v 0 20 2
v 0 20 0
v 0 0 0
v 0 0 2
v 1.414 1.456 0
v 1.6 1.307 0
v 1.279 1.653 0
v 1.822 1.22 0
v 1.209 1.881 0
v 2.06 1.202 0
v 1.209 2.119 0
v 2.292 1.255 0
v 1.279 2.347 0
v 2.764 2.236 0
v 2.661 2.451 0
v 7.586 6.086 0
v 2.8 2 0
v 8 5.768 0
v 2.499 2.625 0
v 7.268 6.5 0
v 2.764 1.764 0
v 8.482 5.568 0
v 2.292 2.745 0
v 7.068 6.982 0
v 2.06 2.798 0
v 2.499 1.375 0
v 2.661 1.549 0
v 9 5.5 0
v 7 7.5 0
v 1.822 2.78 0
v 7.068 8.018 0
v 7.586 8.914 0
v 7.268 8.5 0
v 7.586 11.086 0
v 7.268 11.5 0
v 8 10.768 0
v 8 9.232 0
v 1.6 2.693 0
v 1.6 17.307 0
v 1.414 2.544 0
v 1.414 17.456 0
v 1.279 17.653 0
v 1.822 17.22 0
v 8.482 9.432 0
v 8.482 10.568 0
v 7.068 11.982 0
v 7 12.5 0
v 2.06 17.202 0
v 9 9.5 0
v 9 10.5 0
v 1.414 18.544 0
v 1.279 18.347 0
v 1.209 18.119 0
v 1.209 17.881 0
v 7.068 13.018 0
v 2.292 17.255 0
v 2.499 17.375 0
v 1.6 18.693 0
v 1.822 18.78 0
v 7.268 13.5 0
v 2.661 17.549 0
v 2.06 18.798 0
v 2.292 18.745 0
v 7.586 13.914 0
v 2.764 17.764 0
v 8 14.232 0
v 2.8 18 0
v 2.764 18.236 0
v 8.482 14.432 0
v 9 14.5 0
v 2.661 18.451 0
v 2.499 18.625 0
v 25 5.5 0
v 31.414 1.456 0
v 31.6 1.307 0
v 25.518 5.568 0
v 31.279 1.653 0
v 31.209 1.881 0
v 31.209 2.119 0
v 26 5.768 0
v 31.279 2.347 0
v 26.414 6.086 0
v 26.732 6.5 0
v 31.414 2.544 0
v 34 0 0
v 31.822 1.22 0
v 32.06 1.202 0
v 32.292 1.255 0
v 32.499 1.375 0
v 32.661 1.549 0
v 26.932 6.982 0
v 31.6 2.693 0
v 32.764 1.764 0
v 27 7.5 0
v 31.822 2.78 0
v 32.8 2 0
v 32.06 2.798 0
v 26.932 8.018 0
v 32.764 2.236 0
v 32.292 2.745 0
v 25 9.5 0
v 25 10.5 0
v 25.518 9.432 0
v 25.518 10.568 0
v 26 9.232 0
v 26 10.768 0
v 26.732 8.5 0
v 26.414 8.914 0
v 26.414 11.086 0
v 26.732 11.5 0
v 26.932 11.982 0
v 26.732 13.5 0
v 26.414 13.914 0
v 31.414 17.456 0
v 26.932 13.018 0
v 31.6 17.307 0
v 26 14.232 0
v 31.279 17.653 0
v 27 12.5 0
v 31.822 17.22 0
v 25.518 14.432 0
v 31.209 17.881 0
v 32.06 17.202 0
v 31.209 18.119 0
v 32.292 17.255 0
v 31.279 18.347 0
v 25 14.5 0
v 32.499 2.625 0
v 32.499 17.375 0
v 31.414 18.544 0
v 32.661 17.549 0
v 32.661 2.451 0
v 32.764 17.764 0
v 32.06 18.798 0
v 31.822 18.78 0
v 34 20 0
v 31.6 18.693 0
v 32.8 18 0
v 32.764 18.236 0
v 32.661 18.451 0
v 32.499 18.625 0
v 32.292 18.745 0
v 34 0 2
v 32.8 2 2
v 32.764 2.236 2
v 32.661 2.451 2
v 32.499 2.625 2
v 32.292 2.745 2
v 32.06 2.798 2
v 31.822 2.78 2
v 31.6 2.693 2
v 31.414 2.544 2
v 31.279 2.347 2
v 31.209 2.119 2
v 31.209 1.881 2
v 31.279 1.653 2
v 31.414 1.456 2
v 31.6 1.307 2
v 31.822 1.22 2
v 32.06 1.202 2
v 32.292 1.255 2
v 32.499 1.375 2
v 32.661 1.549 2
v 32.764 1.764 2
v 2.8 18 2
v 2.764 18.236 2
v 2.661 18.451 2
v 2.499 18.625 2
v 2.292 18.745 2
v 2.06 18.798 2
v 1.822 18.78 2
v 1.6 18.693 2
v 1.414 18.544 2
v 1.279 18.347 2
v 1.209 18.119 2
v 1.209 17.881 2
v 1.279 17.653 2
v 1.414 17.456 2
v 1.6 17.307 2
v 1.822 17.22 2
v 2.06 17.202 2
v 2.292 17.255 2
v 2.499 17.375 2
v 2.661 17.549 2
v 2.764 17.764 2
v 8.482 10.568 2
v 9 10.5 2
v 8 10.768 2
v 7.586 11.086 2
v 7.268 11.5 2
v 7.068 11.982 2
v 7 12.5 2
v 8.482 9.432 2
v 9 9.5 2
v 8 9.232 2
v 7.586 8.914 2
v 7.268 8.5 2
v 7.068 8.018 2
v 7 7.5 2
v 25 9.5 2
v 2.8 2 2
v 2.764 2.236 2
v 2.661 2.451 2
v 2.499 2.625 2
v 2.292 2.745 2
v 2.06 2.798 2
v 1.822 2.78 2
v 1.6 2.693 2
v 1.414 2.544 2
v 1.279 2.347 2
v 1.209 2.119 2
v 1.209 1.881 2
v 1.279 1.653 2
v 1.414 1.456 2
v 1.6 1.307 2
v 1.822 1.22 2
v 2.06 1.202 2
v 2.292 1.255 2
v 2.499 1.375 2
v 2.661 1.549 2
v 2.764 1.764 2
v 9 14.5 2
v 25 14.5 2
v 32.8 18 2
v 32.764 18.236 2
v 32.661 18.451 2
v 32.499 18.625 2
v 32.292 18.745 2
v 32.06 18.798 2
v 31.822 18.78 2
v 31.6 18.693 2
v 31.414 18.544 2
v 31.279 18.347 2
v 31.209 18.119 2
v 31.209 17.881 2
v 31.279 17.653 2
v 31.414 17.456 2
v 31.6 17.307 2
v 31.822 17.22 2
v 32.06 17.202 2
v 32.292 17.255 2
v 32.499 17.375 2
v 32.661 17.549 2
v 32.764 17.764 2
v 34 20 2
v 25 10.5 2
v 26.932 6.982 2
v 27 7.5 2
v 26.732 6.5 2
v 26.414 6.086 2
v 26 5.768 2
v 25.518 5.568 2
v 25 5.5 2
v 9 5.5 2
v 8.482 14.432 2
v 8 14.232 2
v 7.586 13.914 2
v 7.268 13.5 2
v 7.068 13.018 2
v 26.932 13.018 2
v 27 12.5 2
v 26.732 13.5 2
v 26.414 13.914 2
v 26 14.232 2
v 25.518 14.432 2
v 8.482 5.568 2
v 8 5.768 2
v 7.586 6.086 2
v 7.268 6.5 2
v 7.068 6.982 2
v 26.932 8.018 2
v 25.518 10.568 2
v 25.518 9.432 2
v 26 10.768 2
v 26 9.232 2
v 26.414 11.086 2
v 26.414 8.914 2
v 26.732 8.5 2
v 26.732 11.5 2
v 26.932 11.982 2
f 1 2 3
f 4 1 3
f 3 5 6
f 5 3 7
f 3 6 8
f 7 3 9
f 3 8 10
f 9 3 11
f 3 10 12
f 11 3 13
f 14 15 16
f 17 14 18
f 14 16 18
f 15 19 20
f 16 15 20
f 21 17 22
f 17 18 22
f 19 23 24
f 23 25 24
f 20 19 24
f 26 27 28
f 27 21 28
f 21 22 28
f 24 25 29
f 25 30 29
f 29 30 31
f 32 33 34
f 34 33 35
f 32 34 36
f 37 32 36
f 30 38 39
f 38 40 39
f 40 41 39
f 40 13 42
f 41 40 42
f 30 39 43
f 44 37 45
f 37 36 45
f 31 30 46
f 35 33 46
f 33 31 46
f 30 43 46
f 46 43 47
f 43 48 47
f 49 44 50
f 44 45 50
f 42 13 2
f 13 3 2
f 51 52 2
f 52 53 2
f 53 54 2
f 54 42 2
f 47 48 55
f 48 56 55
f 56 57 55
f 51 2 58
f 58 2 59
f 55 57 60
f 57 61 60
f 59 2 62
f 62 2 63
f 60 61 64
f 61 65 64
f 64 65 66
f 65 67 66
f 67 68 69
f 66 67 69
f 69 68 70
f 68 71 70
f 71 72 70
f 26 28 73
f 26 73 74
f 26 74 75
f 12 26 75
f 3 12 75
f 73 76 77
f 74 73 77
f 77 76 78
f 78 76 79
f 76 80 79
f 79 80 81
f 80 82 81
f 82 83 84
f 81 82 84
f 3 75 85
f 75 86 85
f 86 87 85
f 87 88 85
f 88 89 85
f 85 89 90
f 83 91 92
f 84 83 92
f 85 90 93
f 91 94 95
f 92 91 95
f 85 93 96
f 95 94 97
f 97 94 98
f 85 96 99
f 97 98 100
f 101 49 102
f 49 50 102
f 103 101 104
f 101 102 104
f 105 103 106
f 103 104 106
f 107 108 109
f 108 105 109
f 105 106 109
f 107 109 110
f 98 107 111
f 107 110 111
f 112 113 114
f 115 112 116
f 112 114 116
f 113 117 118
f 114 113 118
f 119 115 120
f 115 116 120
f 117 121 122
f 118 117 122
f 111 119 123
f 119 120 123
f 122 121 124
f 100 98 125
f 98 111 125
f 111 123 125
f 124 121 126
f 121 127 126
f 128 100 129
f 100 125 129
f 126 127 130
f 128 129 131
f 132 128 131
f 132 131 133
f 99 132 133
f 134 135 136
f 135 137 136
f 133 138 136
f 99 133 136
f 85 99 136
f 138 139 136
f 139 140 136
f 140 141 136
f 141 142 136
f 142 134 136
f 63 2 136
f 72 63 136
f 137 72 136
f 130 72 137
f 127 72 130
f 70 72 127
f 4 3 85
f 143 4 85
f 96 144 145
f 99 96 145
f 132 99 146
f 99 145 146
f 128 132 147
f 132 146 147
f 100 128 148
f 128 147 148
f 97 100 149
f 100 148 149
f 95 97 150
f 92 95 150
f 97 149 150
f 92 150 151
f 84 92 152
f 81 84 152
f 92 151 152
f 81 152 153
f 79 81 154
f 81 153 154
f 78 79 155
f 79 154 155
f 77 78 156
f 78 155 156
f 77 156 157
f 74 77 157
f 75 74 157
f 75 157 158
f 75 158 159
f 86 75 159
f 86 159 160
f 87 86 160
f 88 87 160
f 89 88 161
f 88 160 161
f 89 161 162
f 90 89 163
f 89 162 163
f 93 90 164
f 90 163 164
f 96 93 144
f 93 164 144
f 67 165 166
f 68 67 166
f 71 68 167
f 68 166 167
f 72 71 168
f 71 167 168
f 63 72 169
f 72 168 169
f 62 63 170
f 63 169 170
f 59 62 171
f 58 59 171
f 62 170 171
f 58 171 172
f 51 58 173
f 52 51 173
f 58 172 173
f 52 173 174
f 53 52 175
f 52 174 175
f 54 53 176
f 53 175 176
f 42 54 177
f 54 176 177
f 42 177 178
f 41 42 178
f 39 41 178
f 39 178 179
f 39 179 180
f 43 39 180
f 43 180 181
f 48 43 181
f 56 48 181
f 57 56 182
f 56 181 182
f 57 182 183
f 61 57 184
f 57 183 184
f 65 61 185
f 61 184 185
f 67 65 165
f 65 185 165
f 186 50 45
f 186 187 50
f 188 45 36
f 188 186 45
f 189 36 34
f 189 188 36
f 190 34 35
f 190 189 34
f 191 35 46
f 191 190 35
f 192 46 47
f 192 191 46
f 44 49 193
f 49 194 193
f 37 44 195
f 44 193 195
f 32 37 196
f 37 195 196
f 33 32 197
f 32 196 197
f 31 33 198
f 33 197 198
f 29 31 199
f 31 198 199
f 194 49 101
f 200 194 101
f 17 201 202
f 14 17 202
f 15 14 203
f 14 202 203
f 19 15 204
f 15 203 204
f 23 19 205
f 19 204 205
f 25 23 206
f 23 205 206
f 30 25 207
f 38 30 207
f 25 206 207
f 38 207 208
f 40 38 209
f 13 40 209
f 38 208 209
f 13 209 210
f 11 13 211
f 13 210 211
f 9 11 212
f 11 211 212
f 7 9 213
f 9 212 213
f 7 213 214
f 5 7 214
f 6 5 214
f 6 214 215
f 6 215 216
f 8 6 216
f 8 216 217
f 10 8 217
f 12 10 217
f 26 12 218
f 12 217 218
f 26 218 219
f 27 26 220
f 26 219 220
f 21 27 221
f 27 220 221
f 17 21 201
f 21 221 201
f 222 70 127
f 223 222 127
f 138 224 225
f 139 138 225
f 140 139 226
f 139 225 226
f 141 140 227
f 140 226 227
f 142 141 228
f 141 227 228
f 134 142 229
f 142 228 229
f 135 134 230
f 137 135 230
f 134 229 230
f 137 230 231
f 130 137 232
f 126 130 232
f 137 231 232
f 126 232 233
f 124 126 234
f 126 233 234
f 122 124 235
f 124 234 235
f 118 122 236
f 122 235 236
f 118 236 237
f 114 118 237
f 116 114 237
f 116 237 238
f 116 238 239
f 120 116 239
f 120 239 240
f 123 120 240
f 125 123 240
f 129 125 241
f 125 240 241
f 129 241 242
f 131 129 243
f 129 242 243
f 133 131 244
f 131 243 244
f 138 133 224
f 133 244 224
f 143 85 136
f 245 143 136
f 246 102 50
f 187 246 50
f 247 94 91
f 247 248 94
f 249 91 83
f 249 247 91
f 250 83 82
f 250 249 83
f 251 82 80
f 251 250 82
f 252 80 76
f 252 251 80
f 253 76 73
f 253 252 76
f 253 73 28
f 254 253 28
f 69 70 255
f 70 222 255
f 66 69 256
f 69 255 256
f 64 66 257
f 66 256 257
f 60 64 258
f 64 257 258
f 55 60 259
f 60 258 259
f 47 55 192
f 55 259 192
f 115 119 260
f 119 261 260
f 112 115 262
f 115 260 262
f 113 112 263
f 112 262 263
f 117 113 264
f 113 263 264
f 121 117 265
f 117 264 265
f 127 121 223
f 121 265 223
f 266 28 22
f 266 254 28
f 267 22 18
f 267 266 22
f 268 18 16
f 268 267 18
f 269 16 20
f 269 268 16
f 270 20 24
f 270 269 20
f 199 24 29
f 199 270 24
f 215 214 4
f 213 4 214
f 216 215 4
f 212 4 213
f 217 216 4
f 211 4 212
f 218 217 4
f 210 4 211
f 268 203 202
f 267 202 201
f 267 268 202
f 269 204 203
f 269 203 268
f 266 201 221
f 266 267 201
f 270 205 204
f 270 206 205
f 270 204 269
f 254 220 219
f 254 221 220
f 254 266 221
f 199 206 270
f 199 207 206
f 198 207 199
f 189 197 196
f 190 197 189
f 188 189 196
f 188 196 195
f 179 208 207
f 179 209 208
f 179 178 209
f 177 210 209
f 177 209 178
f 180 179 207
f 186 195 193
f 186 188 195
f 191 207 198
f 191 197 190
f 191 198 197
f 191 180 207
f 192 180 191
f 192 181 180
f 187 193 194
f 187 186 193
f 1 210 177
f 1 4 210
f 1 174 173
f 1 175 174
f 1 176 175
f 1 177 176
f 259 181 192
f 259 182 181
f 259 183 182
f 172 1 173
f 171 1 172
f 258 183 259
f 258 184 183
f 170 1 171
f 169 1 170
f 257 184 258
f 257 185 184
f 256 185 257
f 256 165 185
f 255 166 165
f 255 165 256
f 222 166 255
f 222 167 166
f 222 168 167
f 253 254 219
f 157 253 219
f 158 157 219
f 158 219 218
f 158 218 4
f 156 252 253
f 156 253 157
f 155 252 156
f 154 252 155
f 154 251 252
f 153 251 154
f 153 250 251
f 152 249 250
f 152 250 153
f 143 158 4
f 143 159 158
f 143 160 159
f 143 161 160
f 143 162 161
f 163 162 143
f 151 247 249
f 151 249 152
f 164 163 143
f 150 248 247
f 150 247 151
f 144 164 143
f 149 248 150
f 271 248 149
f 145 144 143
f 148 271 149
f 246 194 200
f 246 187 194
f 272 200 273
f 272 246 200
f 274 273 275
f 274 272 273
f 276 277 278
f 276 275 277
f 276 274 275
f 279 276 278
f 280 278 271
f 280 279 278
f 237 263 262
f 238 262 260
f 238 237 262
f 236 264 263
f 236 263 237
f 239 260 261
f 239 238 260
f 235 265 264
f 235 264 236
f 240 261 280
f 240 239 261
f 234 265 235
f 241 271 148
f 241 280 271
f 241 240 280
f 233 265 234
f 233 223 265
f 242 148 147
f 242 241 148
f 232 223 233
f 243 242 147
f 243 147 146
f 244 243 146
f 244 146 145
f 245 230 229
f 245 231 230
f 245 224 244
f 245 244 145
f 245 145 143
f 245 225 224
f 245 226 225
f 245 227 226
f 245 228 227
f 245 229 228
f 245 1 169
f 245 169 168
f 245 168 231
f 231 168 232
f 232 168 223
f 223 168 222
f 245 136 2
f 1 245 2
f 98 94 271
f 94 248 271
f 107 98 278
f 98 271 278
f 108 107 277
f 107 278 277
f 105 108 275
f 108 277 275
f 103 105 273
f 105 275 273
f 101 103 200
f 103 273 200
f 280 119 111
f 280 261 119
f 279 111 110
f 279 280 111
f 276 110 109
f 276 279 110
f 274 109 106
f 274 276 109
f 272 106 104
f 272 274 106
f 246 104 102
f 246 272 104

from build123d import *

# Parameters (mm, degrees)
BOSS_EXTRUDE2_DEPTH = 2
SKETCH2_R           = 0.8
CUT_EXTRUDE1_DEPTH  = 2
FILLET1_R           = 2


with BuildPart() as part:
    # Sketch1 → Boss-Extrude2 (new body)
    with BuildSketch(Plane.XY):
        Polygon((17, 10.5), (17, 10), (34, 10), (34, 20), (17, 20), (17, 14.5), (27, 14.5), (27, 10.5), align=None)
        Polygon((34, 10), (17, 10), (17, 9.5), (27, 9.5), (27, 5.5), (17, 5.5), (17, 0), (34, 0), align=None)
        Polygon((17, 10), (0, 10), (0, 0), (17, 0), (17, 5.5), (7, 5.5), (7, 9.5), (17, 9.5), align=None)
        Polygon((0, 20), (0, 10), (17, 10), (17, 10.5), (7, 10.5), (7, 14.5), (17, 14.5), (17, 20), align=None)
    extrude(amount=BOSS_EXTRUDE2_DEPTH)

    # Sketch2 → Cut-Extrude1 (cut)
    with BuildSketch(Plane.XY.offset(2)):
        with Locations((2, 2)):
            Circle(SKETCH2_R)
        with Locations((2, 18)):
            Circle(SKETCH2_R)
        with Locations((32, 18)):
            Circle(SKETCH2_R)
        with Locations((32, 2)):
            Circle(SKETCH2_R)
    extrude(amount=-CUT_EXTRUDE1_DEPTH, mode=Mode.SUBTRACT)

    # Fillet1
    fillet1_edges = [part.edges().sort_by_distance(p)[0] for p in [
        (7, 9.5, 1),
        (7, 5.5, 1),
        (27, 9.5, 1),
        (27, 5.5, 1),
        (27, 10.5, 1),
        (27, 14.5, 1),
        (7, 10.5, 1),
        (7, 14.5, 1),
    ]]
    fillet(fillet1_edges, radius=FILLET1_R - 0.0001)  # a hair under: the kernel refuses the full size


solid = part.part
